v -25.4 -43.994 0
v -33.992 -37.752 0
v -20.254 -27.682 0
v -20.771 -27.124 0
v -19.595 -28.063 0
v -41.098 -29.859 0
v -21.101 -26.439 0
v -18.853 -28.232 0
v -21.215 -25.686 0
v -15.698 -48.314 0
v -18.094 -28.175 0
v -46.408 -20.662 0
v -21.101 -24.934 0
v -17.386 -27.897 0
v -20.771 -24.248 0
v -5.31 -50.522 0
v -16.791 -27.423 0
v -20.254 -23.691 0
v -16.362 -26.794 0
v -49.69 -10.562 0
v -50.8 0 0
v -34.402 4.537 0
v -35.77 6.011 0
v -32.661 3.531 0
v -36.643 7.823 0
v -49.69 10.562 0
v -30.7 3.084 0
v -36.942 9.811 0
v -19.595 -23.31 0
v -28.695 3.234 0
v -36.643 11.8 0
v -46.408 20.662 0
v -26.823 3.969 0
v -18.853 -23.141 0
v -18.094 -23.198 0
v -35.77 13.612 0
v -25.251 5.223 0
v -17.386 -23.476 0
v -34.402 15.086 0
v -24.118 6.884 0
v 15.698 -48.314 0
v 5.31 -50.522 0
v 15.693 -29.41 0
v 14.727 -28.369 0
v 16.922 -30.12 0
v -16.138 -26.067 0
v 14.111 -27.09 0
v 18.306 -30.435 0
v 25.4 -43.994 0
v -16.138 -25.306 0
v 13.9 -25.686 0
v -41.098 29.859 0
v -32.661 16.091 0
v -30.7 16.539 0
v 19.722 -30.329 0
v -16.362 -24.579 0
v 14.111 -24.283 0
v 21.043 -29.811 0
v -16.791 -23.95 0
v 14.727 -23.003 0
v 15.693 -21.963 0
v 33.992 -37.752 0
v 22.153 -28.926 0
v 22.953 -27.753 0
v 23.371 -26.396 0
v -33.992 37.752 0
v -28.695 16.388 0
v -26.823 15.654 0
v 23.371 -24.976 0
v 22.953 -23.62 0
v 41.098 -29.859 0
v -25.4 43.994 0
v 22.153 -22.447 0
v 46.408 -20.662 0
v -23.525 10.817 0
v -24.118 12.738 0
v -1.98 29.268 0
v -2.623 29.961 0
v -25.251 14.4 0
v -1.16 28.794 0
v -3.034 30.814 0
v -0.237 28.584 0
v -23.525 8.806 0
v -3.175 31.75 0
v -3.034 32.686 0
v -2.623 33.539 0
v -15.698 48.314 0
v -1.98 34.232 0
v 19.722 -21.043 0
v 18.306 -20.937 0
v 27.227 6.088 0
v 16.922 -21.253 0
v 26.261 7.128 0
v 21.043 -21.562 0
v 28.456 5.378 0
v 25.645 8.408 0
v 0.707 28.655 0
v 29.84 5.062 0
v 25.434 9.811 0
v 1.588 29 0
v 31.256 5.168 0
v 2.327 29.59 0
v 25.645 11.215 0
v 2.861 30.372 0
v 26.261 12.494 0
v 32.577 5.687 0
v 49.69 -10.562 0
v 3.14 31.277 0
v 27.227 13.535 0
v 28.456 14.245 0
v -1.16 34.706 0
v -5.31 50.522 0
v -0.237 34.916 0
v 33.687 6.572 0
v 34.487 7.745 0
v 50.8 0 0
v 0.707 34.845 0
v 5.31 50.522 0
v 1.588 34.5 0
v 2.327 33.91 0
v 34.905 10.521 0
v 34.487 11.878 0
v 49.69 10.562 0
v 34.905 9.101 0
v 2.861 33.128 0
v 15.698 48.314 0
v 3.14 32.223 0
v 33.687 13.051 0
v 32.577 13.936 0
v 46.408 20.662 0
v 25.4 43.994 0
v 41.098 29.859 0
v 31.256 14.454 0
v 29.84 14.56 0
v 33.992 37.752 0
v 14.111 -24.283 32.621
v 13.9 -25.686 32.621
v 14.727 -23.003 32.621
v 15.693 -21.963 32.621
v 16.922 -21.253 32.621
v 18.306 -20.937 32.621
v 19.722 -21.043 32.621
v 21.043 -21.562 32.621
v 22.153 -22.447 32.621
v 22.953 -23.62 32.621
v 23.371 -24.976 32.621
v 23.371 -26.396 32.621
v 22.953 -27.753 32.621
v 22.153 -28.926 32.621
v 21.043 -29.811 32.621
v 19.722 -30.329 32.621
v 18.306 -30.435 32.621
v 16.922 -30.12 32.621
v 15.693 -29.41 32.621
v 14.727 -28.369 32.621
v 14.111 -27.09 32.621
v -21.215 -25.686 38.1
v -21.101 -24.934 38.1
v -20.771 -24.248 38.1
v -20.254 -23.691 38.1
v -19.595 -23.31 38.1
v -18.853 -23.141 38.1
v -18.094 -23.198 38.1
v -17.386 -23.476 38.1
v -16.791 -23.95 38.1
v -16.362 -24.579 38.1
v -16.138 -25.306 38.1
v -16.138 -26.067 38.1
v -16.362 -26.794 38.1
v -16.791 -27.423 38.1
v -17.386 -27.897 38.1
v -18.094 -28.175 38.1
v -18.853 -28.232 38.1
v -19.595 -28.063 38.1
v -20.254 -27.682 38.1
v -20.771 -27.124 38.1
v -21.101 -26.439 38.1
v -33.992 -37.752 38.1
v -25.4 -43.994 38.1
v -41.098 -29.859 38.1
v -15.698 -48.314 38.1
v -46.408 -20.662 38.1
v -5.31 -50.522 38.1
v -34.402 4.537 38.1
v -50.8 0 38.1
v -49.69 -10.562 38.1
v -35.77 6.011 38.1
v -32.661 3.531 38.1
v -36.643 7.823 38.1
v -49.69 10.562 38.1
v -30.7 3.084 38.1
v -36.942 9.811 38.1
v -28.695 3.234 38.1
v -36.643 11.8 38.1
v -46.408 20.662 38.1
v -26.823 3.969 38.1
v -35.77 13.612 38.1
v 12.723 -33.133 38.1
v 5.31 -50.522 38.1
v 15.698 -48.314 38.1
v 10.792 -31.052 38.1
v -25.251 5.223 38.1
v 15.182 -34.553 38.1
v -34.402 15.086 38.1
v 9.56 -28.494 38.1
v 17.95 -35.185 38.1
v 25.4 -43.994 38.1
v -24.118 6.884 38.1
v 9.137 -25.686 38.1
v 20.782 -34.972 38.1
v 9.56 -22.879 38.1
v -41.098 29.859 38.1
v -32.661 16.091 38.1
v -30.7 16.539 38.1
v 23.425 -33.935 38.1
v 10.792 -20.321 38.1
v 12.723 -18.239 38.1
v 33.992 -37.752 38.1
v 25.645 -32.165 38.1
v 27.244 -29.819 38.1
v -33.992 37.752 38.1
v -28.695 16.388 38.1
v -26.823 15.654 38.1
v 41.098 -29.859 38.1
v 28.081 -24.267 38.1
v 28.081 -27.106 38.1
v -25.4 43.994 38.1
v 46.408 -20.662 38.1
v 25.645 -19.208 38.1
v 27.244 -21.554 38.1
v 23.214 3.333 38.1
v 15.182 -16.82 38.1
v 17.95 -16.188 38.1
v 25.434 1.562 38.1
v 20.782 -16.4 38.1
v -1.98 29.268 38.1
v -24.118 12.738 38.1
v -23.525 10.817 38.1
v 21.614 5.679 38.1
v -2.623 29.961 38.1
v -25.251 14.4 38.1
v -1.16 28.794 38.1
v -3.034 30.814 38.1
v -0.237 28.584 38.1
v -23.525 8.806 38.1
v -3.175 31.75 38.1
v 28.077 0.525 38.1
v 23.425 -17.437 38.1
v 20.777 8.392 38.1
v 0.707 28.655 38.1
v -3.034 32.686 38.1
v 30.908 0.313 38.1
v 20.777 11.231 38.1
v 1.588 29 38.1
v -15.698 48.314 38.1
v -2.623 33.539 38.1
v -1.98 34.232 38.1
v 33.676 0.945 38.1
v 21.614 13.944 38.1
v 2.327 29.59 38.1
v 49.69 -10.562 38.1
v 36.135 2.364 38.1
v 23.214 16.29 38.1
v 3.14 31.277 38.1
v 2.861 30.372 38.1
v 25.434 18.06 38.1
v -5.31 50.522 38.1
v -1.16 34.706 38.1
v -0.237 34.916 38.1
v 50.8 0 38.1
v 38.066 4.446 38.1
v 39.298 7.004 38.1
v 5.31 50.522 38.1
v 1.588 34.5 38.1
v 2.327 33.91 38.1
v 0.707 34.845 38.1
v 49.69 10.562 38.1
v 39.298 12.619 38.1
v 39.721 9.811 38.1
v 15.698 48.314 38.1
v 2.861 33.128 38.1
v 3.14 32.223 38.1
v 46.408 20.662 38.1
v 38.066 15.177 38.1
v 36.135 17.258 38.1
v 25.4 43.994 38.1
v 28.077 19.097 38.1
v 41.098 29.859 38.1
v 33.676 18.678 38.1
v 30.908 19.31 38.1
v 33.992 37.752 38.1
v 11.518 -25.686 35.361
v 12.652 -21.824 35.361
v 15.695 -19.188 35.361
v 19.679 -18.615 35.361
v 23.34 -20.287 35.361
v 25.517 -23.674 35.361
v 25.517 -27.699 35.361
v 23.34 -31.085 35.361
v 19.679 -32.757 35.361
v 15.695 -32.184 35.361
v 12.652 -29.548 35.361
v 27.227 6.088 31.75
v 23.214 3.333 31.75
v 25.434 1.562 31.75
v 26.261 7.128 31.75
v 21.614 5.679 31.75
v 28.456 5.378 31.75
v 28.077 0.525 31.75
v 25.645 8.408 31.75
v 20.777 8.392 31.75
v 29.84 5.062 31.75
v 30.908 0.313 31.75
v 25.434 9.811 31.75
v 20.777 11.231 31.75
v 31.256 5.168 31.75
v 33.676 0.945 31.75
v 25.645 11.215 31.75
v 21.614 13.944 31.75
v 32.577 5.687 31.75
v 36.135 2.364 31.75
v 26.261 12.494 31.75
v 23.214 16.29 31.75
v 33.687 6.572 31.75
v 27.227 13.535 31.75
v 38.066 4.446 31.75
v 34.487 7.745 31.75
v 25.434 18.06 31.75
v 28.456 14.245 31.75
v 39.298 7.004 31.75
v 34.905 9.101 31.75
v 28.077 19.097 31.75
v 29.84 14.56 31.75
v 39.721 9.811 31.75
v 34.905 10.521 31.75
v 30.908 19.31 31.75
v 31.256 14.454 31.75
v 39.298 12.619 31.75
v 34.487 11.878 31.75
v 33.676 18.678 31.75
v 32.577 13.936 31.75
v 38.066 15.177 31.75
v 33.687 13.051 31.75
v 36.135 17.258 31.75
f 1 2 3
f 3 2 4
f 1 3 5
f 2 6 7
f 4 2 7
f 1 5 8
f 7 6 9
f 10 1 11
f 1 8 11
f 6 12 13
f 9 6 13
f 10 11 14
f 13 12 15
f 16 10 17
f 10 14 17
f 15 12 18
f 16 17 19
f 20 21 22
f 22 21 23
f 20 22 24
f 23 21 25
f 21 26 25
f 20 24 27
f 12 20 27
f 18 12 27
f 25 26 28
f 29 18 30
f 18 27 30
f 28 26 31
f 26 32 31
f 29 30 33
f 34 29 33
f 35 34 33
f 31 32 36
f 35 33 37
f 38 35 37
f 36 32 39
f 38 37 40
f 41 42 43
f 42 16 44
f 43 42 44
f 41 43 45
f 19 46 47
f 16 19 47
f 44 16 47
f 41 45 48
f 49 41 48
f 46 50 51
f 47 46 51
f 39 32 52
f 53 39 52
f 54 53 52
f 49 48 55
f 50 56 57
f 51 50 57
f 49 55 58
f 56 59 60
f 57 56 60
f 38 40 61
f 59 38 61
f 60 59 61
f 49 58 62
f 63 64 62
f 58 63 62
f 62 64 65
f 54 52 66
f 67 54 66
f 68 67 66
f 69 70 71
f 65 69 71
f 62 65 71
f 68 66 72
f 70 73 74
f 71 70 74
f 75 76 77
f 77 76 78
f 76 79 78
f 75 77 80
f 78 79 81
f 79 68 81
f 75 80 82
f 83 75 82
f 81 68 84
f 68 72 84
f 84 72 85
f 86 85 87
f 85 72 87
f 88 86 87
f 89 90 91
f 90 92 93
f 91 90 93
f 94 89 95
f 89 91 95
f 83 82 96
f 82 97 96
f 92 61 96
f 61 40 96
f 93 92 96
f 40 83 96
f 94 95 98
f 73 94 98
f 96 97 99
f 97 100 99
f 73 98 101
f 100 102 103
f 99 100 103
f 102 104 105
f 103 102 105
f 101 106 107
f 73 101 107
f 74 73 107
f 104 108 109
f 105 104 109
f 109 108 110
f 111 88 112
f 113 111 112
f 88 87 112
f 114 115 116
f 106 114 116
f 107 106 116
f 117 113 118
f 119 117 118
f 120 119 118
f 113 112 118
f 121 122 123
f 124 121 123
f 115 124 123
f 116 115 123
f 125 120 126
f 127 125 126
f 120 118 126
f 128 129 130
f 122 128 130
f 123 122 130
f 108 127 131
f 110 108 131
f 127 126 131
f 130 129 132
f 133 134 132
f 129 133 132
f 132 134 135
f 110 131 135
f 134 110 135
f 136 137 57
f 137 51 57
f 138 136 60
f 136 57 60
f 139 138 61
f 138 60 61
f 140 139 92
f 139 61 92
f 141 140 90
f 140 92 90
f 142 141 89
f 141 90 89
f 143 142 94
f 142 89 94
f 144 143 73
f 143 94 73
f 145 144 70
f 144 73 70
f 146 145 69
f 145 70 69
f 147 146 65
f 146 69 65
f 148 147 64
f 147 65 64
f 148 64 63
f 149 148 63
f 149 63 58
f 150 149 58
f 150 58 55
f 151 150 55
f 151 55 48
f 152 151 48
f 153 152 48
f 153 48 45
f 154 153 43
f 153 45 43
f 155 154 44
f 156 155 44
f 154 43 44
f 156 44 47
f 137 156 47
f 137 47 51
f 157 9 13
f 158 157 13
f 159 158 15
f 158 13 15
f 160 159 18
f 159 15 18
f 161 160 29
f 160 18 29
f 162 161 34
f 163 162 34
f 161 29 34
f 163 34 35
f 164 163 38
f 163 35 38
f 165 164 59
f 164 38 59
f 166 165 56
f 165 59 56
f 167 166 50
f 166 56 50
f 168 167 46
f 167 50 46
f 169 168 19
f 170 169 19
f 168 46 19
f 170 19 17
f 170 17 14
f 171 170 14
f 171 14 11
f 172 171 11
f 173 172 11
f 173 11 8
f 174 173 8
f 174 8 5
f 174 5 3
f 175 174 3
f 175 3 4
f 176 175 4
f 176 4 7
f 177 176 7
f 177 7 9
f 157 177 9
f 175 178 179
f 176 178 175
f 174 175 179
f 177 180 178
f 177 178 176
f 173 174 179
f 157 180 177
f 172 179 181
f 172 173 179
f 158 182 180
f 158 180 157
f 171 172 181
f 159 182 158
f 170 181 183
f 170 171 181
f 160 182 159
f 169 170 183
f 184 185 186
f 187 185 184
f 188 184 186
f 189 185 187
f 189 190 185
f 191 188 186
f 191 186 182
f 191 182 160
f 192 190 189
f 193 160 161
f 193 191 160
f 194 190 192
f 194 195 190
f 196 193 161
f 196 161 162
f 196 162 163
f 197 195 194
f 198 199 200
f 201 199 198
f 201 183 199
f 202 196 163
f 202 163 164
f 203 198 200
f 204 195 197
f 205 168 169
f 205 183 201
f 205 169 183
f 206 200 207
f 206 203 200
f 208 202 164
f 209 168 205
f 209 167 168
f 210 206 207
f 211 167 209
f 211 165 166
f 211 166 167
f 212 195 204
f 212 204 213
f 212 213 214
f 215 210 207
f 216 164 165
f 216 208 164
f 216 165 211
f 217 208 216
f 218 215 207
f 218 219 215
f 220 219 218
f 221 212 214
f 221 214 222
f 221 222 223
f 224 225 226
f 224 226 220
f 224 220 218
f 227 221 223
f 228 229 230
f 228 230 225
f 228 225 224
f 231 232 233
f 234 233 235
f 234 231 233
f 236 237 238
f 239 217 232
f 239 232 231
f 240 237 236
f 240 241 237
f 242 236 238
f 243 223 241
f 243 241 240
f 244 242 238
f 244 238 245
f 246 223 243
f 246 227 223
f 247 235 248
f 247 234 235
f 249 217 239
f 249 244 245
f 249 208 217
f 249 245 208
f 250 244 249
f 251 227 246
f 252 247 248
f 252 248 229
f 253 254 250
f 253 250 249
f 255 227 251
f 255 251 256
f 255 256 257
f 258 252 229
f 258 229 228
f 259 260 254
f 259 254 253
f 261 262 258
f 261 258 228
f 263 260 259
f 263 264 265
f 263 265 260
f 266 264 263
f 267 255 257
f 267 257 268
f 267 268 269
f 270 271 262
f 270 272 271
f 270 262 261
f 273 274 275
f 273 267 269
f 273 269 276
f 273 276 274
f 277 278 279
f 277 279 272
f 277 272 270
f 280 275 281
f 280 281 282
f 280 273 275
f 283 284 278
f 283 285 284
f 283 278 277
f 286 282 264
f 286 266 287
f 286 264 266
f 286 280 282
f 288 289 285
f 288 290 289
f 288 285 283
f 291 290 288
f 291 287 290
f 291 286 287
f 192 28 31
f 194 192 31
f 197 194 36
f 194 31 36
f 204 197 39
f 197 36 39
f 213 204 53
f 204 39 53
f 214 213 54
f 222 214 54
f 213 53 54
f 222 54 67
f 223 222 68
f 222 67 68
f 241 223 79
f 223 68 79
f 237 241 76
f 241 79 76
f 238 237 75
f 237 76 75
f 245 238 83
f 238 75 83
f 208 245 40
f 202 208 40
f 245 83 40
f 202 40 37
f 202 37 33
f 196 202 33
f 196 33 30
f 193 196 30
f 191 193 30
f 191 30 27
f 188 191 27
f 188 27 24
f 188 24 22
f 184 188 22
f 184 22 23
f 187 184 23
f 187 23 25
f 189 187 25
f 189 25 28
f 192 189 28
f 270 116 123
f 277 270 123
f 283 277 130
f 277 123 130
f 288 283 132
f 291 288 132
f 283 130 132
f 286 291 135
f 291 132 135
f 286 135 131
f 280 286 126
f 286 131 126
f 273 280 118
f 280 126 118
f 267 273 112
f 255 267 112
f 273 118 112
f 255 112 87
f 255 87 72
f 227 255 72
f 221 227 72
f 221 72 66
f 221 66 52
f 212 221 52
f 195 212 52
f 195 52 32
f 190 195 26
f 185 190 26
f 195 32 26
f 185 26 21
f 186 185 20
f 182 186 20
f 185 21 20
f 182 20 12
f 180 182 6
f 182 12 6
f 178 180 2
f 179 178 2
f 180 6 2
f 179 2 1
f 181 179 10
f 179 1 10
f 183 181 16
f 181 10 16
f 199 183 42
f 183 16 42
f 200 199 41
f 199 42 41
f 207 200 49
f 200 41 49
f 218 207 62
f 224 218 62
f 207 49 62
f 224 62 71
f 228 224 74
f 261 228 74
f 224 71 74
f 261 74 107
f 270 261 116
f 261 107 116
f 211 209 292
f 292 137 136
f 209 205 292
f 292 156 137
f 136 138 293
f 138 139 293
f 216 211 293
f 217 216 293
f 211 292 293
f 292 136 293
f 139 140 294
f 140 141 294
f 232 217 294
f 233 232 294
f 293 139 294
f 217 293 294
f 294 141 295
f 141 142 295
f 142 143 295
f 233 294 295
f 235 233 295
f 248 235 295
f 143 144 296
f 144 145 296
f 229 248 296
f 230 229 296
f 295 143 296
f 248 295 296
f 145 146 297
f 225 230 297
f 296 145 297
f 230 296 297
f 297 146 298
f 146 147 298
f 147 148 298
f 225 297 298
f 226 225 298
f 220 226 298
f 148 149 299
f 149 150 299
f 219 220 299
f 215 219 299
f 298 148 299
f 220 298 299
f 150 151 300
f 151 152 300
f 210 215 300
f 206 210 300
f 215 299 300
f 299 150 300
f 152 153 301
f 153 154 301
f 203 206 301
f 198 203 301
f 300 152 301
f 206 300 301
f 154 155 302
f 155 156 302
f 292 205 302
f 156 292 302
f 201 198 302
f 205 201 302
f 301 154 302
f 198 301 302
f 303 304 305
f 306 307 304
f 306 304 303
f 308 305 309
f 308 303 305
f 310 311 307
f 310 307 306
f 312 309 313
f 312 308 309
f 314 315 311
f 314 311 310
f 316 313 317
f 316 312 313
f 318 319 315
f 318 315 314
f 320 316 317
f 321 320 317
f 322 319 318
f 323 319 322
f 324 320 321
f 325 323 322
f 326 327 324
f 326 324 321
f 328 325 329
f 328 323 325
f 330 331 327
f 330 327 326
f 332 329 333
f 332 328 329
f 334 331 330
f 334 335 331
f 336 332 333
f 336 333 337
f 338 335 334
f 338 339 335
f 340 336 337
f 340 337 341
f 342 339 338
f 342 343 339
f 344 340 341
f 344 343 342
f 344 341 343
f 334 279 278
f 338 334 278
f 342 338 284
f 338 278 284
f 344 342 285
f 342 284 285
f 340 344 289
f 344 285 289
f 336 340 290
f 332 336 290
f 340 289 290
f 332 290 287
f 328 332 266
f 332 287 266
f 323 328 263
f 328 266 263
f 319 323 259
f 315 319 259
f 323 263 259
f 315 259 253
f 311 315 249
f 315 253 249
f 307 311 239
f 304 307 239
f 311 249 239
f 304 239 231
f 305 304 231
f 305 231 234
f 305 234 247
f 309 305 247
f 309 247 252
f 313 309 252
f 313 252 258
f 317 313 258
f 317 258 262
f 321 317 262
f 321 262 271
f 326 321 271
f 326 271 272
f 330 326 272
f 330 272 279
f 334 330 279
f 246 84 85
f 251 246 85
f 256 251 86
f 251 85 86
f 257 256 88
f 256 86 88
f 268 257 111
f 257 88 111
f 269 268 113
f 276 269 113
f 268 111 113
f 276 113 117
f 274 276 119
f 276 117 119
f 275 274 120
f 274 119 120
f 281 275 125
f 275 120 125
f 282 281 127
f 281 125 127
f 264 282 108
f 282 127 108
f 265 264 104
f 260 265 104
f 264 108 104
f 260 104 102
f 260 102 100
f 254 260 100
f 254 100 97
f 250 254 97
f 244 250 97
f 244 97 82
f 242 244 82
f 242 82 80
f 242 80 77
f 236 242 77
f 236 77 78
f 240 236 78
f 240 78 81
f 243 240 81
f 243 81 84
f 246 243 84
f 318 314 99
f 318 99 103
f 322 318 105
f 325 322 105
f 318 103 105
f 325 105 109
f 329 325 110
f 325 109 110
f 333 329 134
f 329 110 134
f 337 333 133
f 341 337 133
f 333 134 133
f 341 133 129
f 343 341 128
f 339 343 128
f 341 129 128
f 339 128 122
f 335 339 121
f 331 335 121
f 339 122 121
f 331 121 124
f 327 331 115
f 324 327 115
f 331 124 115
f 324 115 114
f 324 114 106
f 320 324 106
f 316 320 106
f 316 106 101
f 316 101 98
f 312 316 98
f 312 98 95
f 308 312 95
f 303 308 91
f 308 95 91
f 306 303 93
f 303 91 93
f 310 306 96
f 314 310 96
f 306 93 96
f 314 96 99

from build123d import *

# Parameters (mm, degrees)
F0_R           = 50.8
F1_DEPTH       = 38.1
F3_D           = 6.35
F4_D           = 9.525
F4_CBORE_D     = 19.05
F4_CBORE_DEPTH = 6.35
F5_D           = 9.525
F5_CSINK_D     = 19.05
F5_CSINK_ANGLE = 82
F6_D           = 5.1054
F7_D           = 13.49248


with BuildPart() as f1:
    # F0 (on Top) → F1 (new body)
    with BuildSketch(Plane.XY):
        Circle(F0_R)
    extrude(amount=F1_DEPTH)

    # F3 (through all)
    with Locations(Plane.XY.offset(38.1)):
        with Locations((0, 31.75)):
            Hole(F3_D / 2)

    # F4 (through all)
    with Locations(Plane.XY.offset(38.1)):
        with Locations((30.1960443924, 9.8112895714)):
            CounterBoreHole(F4_D / 2, F4_CBORE_D / 2, F4_CBORE_DEPTH)

    # F5 (through all)
    with Locations(Plane.XY.offset(38.1)):
        with Locations((18.6621817603, -25.6862895714)):
            CounterSinkHole(F5_D / 2, F5_CSINK_D / 2, counter_sink_angle=F5_CSINK_ANGLE)

    # F6 (through all)
    with Locations(Plane.XY.offset(38.1)):
        with Locations((-18.6621817603, -25.6862895714)):
            Hole(F6_D / 2)

    # F7 (through all)
    with Locations(Plane.XY.offset(38.1)):
        with Locations((-30.1960443924, 9.8112895714)):
            Hole(F7_D / 2)


solid = f1.part
